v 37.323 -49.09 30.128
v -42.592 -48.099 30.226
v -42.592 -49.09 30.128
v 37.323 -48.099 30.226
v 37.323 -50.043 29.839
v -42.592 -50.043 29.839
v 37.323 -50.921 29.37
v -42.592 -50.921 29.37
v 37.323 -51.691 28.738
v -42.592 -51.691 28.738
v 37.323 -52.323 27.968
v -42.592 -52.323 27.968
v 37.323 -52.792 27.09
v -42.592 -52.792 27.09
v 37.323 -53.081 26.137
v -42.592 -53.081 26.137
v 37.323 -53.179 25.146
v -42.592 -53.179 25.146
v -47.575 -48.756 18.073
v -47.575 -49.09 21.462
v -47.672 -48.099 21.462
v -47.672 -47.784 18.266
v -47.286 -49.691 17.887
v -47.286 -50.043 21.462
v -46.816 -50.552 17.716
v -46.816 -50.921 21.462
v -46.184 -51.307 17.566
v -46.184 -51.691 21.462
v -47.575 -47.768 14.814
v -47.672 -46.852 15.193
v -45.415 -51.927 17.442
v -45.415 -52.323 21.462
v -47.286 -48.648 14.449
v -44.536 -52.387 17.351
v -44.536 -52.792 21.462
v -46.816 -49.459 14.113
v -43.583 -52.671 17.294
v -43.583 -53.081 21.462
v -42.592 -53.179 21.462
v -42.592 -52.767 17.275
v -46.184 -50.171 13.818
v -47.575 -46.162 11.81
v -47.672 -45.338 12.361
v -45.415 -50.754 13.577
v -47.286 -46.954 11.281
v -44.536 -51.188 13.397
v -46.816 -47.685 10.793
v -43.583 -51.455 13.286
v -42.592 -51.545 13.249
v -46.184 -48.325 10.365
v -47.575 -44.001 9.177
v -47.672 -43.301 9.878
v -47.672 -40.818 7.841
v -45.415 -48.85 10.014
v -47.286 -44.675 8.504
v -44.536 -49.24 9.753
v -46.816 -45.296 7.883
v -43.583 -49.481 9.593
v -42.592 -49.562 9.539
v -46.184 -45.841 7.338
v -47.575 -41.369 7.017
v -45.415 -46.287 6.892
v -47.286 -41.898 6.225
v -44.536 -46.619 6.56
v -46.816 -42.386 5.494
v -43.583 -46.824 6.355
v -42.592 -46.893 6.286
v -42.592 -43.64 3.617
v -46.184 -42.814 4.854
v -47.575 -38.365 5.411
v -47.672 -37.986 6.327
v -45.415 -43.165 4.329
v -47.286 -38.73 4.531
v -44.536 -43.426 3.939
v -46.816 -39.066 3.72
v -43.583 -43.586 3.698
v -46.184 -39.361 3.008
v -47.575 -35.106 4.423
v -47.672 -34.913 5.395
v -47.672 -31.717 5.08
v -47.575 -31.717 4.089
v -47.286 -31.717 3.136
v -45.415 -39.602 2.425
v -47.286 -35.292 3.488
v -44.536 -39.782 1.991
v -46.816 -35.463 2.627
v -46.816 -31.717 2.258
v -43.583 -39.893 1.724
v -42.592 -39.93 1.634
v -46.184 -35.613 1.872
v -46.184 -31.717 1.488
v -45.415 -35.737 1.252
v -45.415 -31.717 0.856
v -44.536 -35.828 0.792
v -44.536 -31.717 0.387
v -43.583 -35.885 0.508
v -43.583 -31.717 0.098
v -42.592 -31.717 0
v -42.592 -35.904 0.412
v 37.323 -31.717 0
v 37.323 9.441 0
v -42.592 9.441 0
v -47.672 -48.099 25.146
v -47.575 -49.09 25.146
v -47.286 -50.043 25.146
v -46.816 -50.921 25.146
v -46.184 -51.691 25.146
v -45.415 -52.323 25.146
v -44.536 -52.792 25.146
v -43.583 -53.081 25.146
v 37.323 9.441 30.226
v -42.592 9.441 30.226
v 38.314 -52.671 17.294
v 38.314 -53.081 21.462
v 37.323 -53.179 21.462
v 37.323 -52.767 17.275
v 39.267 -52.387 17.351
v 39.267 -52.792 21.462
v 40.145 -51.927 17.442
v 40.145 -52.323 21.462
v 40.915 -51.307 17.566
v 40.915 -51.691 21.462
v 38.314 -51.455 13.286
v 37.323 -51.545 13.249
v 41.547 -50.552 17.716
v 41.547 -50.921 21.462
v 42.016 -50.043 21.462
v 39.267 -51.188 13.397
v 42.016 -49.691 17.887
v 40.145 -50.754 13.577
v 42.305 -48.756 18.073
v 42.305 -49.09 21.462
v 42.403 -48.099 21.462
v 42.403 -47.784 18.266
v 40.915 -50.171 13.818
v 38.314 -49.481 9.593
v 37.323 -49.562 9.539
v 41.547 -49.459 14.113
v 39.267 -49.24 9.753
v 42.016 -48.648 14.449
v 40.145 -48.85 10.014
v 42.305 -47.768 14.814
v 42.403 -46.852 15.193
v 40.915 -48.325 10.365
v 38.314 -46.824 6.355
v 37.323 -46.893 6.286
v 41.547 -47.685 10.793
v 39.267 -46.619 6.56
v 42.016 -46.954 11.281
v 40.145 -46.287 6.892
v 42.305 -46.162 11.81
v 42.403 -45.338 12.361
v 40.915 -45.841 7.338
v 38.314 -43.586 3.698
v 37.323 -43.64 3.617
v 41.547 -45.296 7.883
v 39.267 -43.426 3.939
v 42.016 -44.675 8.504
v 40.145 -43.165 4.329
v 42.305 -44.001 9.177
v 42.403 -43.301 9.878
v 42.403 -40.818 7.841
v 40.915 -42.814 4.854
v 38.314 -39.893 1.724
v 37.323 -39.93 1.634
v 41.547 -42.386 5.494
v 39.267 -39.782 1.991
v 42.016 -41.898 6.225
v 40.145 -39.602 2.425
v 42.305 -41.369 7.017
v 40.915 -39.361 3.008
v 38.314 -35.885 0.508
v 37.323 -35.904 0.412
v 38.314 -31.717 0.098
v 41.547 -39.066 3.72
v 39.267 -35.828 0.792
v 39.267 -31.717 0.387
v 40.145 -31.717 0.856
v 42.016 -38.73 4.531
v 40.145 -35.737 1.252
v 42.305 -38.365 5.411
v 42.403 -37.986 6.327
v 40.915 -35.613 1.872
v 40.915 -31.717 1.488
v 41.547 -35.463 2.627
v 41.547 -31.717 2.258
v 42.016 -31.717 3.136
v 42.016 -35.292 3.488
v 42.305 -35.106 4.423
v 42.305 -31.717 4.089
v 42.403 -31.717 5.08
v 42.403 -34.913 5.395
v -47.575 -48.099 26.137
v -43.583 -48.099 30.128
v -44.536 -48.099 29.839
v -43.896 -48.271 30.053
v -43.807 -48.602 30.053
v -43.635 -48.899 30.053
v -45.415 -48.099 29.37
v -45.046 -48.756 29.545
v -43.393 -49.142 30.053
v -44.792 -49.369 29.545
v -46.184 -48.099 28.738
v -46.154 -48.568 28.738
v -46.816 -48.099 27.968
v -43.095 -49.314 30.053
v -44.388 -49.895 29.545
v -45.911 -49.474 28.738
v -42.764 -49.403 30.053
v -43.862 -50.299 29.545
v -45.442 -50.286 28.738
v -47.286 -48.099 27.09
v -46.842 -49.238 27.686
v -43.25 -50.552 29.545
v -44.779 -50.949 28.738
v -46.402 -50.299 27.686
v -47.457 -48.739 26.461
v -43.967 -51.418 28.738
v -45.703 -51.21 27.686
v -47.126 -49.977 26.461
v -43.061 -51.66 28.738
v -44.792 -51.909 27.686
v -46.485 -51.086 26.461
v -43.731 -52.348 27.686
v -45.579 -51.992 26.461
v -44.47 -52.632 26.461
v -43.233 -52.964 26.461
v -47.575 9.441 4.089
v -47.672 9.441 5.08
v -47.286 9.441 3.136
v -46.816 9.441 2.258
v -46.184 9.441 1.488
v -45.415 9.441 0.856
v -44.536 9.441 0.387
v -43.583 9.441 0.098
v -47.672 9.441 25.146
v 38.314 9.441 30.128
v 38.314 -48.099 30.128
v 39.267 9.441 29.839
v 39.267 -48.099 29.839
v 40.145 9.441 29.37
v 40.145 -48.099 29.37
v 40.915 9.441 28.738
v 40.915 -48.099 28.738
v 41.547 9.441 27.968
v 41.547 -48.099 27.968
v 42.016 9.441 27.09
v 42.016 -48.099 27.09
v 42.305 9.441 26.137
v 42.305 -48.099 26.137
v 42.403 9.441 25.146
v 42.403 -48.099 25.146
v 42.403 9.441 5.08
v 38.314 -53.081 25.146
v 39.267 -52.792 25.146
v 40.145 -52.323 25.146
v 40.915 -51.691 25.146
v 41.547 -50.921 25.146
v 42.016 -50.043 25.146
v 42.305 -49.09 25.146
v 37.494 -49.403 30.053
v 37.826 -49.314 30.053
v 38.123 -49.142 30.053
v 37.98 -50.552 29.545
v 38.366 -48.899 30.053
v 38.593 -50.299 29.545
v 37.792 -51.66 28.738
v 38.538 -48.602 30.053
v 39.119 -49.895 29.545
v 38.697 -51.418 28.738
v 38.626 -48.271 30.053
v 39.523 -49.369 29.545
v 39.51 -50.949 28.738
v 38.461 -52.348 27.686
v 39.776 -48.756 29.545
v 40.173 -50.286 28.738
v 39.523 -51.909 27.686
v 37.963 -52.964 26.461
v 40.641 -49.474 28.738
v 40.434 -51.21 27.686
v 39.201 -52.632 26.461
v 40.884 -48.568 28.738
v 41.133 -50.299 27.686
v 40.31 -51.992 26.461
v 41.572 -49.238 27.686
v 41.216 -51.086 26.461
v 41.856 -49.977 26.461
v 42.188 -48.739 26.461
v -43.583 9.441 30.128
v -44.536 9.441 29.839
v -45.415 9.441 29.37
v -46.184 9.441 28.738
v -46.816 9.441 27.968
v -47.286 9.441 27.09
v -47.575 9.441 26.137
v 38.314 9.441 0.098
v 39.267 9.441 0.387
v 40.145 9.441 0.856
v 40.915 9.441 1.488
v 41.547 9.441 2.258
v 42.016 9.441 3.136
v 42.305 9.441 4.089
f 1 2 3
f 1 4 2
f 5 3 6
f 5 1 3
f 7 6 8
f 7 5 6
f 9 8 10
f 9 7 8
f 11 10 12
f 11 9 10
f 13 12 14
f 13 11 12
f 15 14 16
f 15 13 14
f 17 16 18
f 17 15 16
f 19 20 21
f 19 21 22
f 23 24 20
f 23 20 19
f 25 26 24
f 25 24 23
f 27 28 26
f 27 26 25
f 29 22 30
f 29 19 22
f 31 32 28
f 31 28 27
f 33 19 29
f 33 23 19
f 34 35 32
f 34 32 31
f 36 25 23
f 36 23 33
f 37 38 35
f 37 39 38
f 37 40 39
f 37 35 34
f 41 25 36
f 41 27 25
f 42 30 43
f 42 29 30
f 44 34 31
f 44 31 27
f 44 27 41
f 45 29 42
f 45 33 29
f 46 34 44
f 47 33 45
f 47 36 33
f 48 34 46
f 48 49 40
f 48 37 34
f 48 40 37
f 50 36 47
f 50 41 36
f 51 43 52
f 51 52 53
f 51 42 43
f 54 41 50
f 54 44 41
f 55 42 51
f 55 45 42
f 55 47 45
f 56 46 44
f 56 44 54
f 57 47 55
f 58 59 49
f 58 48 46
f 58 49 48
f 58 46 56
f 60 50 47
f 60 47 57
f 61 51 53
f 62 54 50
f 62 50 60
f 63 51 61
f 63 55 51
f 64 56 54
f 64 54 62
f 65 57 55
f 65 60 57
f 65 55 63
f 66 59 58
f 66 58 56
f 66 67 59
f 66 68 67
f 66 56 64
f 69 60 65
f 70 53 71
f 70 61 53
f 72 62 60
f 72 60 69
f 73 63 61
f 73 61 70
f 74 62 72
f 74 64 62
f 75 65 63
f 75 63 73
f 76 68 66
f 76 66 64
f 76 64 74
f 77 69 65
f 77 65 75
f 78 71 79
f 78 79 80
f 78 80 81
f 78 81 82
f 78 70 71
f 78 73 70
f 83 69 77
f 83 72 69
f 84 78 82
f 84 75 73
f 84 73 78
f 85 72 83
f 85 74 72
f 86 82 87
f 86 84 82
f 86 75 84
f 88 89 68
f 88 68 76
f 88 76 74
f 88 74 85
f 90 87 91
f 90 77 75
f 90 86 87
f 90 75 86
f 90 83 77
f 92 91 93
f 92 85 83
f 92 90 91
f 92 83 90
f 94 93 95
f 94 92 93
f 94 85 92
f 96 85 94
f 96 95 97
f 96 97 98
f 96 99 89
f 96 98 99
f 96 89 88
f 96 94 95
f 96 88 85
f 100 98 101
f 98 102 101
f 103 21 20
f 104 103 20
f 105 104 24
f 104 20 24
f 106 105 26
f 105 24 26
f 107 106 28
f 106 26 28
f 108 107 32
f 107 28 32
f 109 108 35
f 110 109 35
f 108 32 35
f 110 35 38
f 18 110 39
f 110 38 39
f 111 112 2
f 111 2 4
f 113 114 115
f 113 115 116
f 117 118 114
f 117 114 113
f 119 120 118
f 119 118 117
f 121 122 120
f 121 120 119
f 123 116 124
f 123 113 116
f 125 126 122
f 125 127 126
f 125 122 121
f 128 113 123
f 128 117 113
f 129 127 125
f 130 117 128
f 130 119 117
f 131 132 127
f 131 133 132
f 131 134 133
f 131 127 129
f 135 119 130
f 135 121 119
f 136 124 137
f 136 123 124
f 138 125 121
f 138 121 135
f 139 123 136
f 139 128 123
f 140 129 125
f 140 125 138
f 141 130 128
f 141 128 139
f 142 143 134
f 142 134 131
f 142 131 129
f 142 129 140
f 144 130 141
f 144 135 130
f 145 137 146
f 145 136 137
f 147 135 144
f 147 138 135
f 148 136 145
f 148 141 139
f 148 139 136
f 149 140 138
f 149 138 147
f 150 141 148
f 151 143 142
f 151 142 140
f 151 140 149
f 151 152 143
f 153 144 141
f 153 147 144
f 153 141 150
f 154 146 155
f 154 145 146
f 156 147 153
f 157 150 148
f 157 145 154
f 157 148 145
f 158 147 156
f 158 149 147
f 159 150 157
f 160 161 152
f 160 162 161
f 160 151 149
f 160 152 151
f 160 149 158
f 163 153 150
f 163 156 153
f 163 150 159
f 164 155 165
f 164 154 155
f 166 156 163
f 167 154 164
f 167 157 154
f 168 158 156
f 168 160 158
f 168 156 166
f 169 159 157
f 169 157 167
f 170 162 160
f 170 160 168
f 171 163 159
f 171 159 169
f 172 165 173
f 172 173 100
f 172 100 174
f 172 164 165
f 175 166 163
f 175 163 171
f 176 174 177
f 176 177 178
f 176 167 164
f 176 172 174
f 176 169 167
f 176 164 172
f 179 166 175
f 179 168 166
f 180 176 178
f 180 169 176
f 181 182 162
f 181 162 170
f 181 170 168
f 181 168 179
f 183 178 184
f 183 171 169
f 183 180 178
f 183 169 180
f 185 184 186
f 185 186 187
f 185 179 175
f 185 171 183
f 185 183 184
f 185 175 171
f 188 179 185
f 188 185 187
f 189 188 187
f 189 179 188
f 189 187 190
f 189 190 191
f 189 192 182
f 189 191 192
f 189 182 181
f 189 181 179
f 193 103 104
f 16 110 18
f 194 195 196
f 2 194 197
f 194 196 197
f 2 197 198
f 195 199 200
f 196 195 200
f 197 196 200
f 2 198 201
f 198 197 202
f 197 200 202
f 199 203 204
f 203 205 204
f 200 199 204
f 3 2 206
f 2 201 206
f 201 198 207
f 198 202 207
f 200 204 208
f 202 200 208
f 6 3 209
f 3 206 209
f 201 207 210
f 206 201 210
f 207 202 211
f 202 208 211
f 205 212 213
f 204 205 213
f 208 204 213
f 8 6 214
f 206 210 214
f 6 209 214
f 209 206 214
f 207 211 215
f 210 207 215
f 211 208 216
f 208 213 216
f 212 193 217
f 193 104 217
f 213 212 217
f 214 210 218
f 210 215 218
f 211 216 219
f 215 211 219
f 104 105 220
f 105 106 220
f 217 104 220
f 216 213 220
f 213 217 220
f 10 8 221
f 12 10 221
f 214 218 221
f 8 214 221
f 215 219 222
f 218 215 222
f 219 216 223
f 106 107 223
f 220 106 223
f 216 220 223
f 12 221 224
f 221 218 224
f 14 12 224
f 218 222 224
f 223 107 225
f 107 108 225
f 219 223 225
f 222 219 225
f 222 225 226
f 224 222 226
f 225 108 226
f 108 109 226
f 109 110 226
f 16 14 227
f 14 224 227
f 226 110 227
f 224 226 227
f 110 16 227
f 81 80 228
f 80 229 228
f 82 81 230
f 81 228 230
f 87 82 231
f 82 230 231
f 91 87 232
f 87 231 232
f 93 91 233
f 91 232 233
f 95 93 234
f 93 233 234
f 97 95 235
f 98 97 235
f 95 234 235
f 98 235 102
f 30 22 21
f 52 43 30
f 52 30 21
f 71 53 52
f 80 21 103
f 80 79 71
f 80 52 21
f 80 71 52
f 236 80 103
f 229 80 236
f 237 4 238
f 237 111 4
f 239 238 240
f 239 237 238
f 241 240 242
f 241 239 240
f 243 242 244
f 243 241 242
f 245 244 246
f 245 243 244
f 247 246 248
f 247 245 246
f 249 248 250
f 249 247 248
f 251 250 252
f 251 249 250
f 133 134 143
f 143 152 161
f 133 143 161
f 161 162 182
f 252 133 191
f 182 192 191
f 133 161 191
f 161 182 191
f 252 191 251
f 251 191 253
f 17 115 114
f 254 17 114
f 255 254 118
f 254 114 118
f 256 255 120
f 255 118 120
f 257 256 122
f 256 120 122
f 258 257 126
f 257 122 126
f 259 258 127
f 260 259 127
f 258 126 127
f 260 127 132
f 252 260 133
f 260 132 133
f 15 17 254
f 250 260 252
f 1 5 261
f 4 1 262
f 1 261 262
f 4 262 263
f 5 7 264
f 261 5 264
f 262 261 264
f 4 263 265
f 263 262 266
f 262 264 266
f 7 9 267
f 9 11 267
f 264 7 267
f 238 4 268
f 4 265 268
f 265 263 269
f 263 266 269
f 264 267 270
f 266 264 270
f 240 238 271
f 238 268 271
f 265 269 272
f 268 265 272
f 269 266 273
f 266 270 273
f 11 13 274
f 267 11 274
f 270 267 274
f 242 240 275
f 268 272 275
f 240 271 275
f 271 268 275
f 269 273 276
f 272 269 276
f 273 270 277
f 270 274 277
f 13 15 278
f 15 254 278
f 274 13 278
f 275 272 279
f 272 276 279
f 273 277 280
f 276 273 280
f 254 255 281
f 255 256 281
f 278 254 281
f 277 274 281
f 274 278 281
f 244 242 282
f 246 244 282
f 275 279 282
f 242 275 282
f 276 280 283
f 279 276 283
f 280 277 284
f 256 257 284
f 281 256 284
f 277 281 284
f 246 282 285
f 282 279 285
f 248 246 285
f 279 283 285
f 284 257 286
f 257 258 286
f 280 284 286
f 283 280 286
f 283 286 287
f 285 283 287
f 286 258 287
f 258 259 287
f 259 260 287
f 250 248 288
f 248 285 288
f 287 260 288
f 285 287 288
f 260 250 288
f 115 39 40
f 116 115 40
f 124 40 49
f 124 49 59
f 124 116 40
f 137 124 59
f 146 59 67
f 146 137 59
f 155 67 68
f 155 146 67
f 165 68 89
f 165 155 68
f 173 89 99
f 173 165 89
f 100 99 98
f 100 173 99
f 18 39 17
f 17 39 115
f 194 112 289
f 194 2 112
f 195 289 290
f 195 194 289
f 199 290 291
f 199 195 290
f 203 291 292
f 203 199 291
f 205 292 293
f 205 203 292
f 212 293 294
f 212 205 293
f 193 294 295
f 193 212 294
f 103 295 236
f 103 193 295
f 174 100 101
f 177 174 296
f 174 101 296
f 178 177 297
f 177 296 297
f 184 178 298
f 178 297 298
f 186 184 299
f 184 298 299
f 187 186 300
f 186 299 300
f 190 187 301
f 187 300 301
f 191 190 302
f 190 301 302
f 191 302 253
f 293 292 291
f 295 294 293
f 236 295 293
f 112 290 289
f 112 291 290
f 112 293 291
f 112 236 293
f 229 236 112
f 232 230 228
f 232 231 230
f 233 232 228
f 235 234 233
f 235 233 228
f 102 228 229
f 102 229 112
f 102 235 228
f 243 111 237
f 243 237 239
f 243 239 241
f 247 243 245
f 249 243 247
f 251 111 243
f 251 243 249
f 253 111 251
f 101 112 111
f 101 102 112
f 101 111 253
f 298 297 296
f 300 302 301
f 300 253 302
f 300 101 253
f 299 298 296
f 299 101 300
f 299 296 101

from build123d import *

# Parameters (mm, degrees)
F0_W     = 90.075135231
F0_H     = 62.6202728599
F1_DEPTH = 30.226
F2_R     = 21.4623585695
F3_R     = 5.08
F4_R     = 5.08


with BuildPart() as f1:
    # F0 (on Top) → F1 (new body)
    with BuildSketch(Plane.XY):
        with Locations((-2.6347637177, -21.8688407913)):
            Rectangle(F0_W, F0_H)
    extrude(amount=F1_DEPTH)

    # F2
    f2_edges = [f1.edges().sort_by_distance(p)[0] for p in [
        (-2.634764, -53.178977, 0),
    ]]
    fillet(f2_edges, radius=F2_R)

    # F3
    f3_edges = [f1.edges().sort_by_distance(p)[0] for p in [
        (42.402804, -11.137662, 0),
        (-47.672331, -11.137662, 0),
    ]]
    fillet(f3_edges, radius=F3_R)

    # F4
    f4_edges = [f1.edges().sort_by_distance(p)[0] for p in [
        (-2.634764, -53.178977, 21.462359),
        (-42.592331, -53.178977, 25.844179),
        (37.322804, -53.178977, 25.844179),
        (-2.634764, -53.178977, 30.226),
        (-42.592331, -46.892798, 6.286179),
        (37.322804, -46.892798, 6.286179),
        (-2.634764, -31.716619, 0),
    ]]
    fillet(f4_edges, radius=F4_R)


solid = f1.part
